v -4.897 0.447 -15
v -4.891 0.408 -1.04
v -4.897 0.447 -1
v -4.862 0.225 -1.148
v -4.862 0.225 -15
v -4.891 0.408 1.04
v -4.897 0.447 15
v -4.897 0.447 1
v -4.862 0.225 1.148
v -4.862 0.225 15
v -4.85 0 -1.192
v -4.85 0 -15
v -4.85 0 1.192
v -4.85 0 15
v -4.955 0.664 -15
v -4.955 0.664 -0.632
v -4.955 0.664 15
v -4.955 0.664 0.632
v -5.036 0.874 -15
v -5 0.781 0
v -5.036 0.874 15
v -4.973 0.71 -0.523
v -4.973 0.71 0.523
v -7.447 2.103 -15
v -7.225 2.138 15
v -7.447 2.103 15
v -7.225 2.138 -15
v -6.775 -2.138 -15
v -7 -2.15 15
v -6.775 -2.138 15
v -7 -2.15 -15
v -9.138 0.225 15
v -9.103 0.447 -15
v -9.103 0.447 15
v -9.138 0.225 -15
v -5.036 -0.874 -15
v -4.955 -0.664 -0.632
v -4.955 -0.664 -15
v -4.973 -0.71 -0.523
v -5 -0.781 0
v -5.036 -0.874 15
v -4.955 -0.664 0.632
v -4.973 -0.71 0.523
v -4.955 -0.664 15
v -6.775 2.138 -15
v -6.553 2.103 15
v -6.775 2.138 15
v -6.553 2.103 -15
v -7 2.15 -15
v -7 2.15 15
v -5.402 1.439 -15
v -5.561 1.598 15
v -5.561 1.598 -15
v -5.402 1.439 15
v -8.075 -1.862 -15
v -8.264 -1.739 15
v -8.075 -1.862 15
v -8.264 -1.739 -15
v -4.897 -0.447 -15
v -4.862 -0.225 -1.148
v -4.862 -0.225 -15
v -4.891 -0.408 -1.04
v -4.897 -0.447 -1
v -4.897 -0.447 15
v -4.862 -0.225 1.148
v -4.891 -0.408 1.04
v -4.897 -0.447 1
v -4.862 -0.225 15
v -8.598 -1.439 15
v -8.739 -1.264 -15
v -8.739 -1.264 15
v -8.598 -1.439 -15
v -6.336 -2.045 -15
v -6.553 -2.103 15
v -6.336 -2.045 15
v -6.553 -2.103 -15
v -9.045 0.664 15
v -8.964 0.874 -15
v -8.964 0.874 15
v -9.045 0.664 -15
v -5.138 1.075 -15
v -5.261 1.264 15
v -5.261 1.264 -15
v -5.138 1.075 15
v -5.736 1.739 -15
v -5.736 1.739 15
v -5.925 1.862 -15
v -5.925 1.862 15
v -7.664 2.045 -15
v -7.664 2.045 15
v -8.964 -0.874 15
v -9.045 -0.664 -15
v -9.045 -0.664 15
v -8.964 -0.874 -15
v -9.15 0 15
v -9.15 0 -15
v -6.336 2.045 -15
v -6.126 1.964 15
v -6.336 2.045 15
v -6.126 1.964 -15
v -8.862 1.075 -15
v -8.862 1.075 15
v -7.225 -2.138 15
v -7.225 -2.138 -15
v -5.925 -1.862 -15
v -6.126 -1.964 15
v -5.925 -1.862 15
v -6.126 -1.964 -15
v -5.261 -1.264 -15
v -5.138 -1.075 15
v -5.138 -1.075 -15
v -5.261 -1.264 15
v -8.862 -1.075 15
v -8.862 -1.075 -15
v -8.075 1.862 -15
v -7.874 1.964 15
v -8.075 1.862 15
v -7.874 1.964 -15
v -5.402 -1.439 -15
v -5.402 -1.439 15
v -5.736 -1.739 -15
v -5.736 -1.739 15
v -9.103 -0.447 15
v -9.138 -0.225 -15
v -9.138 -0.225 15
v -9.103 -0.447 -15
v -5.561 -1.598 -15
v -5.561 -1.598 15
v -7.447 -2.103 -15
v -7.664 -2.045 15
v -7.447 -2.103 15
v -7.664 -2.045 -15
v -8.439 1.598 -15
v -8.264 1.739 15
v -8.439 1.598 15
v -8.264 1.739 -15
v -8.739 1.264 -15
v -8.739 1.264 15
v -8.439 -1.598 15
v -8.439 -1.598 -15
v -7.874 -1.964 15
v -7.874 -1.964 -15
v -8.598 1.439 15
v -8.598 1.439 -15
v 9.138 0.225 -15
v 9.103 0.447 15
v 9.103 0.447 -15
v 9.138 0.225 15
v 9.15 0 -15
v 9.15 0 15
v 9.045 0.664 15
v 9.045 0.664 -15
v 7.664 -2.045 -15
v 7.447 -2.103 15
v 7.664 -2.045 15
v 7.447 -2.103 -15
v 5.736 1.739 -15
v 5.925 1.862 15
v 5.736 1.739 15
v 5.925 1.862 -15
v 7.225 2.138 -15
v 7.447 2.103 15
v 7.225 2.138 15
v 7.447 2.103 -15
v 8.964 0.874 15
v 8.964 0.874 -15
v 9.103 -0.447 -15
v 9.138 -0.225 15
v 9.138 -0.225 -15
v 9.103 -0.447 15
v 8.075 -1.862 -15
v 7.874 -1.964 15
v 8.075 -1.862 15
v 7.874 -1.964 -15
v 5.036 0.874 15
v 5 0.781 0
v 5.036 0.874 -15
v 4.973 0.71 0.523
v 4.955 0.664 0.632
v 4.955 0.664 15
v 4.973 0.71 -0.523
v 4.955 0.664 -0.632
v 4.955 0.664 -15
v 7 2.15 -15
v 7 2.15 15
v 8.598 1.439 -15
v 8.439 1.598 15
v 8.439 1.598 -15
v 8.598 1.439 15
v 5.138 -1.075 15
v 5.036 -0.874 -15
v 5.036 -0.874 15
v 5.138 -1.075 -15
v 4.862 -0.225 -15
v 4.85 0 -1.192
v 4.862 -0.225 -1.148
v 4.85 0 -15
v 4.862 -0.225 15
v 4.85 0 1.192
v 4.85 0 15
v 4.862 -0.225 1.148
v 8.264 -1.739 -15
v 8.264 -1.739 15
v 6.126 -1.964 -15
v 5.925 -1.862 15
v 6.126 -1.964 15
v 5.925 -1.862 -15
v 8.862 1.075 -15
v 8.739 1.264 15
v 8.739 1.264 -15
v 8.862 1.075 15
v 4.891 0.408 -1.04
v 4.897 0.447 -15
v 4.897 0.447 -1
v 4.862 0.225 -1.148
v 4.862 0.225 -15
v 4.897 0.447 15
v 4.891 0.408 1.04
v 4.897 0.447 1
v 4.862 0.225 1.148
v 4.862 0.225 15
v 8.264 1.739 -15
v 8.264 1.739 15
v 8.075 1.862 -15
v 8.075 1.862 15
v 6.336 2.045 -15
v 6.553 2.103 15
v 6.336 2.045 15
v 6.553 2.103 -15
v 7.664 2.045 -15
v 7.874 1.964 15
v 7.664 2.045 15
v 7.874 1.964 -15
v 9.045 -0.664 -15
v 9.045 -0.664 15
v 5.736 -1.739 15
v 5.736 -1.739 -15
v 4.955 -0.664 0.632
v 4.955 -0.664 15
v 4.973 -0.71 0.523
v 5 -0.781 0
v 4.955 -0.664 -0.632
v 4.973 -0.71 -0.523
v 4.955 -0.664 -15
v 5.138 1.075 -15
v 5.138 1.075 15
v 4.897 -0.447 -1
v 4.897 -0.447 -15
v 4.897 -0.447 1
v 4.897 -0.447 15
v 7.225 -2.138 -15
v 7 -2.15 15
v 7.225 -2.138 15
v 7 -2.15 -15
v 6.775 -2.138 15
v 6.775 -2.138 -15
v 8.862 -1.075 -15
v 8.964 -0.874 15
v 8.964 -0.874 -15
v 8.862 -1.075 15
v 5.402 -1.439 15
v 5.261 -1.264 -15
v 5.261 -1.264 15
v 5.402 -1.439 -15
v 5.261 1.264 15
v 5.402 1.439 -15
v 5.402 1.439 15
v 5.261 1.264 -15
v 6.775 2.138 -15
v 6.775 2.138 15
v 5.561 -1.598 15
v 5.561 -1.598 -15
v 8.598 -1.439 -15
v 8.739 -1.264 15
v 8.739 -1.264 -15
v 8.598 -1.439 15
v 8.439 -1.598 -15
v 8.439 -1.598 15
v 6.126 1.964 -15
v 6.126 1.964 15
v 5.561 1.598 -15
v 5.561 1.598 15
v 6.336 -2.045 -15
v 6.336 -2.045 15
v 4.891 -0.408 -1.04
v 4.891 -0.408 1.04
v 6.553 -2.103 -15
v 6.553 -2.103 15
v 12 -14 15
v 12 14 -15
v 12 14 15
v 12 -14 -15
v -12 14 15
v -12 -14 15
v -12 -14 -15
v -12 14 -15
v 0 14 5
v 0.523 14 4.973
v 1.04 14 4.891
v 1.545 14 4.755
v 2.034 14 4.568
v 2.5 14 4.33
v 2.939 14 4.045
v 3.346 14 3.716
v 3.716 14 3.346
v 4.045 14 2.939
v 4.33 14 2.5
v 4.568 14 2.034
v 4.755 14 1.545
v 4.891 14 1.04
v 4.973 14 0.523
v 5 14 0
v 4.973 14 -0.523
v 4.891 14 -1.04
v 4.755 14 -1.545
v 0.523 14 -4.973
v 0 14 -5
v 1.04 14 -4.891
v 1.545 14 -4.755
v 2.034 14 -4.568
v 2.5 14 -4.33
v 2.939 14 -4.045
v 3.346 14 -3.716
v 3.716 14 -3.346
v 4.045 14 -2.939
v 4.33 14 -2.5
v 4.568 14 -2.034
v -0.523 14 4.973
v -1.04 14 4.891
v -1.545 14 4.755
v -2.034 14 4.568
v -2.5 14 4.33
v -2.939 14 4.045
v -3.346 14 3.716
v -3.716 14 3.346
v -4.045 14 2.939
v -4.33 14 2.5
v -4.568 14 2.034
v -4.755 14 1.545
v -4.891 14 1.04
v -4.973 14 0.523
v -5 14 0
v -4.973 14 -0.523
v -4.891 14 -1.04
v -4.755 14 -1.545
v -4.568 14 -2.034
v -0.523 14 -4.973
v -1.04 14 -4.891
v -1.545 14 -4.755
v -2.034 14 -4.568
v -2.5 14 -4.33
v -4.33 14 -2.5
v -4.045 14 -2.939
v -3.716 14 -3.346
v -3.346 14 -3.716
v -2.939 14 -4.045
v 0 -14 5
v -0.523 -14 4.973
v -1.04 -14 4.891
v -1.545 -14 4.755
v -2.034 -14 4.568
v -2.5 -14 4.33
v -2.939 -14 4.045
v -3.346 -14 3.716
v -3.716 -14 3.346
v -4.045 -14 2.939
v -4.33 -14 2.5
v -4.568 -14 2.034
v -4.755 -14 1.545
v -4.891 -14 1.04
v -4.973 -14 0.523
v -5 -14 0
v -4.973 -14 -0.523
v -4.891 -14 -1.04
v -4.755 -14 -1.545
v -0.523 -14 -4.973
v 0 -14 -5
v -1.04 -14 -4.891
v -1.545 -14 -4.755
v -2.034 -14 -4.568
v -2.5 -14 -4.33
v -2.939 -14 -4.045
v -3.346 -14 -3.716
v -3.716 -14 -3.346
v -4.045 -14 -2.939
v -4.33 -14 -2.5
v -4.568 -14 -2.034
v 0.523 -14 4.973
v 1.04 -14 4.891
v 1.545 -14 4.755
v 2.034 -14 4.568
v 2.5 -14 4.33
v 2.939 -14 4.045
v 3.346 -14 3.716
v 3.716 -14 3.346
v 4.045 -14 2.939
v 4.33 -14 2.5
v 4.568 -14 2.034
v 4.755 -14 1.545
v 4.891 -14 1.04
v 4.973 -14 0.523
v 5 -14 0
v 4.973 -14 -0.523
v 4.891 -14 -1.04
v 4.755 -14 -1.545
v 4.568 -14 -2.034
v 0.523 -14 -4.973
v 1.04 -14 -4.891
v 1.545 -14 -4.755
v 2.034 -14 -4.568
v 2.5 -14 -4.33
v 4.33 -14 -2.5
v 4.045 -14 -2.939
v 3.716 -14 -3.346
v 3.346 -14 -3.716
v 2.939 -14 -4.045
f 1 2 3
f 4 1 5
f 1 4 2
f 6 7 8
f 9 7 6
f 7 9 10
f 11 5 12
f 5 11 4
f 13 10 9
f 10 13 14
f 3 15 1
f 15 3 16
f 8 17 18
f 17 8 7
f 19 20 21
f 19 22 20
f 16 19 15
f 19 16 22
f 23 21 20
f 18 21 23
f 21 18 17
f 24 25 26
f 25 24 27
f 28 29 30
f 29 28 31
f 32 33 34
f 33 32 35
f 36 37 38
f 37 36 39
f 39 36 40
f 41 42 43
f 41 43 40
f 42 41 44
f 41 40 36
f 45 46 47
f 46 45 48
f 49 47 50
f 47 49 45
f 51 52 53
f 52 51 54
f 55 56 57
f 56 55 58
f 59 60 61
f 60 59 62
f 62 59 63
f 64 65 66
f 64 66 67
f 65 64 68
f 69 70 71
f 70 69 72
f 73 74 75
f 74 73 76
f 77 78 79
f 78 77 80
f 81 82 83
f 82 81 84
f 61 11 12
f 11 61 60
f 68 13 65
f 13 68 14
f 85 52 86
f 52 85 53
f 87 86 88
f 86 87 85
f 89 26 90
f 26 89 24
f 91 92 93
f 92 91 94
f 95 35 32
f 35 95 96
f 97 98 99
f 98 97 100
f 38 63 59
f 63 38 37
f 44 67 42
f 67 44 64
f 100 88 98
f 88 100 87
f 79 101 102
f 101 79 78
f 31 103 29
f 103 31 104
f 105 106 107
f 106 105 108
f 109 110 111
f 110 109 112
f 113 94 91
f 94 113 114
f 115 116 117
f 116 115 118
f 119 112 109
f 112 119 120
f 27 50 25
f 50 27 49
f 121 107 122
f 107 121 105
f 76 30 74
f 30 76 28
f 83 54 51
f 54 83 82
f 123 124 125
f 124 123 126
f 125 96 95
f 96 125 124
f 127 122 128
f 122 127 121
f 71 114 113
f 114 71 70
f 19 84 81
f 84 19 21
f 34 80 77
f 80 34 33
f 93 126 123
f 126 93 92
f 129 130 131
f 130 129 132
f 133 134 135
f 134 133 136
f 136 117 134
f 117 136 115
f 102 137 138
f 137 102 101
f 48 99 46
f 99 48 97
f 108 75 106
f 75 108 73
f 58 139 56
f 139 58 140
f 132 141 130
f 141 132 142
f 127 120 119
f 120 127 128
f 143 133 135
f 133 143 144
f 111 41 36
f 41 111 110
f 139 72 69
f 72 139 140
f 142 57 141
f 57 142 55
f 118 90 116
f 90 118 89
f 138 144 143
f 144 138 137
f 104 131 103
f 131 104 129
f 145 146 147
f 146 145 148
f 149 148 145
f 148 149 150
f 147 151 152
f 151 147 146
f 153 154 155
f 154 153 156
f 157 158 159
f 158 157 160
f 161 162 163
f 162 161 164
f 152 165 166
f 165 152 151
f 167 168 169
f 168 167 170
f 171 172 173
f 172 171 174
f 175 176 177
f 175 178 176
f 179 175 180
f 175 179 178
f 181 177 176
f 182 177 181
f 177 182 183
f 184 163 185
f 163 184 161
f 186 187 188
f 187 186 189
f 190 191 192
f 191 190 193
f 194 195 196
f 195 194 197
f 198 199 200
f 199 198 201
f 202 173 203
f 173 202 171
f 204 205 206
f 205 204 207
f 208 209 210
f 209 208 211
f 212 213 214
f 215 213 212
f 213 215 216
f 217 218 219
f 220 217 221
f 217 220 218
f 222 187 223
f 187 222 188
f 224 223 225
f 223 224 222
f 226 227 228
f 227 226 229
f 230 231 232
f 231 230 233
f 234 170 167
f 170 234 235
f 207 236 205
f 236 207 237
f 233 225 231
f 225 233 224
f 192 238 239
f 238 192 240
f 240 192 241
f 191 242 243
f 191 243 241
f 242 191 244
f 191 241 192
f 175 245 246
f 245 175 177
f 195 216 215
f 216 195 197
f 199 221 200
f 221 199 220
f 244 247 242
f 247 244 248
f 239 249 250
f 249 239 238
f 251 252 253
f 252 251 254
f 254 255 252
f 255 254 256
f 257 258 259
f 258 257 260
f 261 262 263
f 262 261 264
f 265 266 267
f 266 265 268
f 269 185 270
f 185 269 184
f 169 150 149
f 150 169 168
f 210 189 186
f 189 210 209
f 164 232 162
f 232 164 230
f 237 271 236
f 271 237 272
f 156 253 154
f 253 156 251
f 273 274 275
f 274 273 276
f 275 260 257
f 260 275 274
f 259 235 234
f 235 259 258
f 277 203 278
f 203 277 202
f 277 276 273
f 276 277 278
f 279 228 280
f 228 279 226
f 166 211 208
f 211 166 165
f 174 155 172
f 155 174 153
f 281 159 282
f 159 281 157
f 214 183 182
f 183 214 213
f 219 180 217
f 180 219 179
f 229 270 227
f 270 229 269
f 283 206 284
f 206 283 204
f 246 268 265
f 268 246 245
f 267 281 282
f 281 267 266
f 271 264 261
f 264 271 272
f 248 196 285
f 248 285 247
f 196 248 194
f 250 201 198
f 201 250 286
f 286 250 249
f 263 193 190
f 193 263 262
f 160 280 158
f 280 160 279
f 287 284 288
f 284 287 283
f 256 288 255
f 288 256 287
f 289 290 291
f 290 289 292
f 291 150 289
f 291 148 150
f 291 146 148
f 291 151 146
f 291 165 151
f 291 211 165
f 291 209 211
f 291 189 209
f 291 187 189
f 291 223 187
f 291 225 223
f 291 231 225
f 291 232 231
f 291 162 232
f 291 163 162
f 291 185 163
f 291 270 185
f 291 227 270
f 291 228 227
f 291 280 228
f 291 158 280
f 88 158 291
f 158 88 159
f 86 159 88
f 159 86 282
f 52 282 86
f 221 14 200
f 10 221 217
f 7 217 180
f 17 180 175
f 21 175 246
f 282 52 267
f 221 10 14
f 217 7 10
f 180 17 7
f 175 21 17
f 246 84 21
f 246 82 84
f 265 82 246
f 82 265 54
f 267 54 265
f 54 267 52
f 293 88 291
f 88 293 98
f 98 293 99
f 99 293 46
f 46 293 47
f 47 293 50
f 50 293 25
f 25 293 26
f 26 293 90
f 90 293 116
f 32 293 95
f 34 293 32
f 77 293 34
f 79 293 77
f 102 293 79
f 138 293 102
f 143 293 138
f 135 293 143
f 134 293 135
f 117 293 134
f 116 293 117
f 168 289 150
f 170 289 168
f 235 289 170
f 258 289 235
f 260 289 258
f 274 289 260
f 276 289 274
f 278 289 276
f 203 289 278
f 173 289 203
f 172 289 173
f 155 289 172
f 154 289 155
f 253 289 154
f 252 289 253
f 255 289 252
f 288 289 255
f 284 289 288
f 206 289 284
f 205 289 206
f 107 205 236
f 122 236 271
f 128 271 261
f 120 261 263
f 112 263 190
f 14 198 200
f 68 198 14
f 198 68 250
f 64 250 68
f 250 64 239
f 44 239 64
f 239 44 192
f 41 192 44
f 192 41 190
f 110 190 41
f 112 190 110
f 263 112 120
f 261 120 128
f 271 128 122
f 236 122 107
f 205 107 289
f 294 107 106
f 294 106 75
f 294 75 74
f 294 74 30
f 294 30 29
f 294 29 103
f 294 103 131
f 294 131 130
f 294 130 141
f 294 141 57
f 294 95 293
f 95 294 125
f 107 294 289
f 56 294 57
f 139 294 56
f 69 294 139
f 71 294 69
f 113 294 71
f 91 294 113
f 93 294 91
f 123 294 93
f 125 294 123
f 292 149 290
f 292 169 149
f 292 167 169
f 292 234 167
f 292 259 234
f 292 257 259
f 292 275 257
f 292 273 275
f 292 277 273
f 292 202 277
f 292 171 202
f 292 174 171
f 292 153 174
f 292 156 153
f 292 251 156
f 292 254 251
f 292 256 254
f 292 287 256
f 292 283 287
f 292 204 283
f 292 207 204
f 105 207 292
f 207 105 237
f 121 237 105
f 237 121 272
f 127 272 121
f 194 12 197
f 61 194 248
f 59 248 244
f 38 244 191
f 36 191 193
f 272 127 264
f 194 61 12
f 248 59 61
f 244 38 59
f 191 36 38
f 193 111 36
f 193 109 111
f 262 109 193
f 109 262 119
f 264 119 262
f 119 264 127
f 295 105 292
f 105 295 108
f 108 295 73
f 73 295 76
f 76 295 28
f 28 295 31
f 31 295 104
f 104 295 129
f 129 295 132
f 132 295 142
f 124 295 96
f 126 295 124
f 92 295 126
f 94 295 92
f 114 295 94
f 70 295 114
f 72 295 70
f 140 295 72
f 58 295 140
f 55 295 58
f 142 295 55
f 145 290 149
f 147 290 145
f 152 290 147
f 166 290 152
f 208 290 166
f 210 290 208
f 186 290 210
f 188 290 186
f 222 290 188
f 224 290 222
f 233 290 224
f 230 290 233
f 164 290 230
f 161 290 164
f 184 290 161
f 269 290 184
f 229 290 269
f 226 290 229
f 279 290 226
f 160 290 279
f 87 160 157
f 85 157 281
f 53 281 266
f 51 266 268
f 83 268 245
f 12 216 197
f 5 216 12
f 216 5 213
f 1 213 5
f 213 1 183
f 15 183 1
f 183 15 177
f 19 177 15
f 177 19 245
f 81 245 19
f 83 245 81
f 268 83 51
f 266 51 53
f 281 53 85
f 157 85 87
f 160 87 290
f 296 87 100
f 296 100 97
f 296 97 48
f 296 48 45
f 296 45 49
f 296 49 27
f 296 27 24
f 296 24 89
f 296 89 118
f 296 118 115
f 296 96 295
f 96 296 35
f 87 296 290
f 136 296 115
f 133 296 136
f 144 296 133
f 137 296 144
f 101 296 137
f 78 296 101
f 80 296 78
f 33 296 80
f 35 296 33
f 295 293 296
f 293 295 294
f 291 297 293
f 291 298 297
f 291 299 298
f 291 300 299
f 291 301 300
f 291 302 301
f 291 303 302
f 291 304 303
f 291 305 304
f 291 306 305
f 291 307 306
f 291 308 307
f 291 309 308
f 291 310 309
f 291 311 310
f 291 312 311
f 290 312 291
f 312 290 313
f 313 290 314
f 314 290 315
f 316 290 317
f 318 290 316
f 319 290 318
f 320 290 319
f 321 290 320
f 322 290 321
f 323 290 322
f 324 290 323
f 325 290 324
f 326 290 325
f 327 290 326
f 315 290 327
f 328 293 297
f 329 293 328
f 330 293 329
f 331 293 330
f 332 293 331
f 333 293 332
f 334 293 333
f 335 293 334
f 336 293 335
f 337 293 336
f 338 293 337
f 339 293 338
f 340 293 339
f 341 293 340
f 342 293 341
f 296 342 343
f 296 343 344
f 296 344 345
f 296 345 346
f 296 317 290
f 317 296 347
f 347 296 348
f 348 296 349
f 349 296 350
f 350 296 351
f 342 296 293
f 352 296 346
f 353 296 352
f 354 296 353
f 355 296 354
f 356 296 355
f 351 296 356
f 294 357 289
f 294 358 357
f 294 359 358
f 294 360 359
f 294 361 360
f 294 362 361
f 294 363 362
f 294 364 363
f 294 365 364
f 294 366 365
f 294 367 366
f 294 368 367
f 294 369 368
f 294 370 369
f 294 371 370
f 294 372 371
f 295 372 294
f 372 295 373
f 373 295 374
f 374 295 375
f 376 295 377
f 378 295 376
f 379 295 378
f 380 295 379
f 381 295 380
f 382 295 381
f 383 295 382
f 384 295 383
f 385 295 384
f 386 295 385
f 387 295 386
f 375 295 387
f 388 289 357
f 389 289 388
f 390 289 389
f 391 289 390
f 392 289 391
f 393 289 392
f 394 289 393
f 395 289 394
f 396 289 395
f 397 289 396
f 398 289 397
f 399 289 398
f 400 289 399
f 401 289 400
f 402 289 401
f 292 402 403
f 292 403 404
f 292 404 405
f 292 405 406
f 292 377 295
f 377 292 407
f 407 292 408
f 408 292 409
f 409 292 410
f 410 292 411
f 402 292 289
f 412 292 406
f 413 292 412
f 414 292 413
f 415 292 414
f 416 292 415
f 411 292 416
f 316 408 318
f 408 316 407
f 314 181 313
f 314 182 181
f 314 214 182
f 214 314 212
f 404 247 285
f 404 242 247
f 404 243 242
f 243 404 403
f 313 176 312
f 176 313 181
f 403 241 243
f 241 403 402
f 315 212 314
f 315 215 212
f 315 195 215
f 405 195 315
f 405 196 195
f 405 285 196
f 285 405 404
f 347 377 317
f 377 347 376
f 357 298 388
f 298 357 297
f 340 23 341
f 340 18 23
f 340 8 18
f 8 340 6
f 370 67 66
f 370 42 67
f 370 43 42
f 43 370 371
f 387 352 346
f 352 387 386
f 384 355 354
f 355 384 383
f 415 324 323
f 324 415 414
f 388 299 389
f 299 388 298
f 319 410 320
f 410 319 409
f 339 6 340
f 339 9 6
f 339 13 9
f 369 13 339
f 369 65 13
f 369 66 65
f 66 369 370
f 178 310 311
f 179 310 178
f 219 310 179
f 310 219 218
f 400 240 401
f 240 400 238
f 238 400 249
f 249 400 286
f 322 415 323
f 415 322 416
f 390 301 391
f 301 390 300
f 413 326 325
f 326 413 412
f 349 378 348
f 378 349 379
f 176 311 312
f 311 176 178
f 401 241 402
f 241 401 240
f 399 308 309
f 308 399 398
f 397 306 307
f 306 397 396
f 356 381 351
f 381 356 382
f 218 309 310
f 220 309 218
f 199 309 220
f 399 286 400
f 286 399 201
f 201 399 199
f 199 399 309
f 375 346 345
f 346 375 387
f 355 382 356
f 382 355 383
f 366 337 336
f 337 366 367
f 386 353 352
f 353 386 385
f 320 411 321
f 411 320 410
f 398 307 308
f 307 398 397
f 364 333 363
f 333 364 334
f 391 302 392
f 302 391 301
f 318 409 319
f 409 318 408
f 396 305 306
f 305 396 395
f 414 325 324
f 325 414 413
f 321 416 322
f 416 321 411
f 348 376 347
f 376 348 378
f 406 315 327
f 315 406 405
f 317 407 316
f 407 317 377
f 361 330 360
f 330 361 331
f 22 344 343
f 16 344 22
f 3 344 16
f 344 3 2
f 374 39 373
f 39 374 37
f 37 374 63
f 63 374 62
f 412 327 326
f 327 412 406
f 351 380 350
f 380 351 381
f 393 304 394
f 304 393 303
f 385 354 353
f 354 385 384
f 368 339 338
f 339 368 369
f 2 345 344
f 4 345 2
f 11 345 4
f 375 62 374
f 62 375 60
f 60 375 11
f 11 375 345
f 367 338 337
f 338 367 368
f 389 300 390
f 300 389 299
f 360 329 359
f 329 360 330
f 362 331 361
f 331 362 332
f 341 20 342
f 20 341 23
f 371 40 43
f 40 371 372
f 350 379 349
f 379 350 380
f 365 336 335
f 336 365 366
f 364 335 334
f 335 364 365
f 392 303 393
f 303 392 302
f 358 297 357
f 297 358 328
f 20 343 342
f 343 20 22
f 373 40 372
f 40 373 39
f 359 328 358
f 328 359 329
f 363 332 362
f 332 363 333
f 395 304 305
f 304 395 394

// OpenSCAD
// Linear rail stop block.
$fn = 60;
eps = 0.02;
width = 28;
height = 30;
bore_d = 10;
length = 24;
difference() {
    cube([length,width,height],center=true);
    translate([0,-width/2-eps,0]) rotate([-90,0,0]) cylinder(d=bore_d,h=width+2*eps);
    for(x=[-7,7]) translate([x,0,-height/2-eps]) cylinder(d=4.3,h=height+2*eps);
}
